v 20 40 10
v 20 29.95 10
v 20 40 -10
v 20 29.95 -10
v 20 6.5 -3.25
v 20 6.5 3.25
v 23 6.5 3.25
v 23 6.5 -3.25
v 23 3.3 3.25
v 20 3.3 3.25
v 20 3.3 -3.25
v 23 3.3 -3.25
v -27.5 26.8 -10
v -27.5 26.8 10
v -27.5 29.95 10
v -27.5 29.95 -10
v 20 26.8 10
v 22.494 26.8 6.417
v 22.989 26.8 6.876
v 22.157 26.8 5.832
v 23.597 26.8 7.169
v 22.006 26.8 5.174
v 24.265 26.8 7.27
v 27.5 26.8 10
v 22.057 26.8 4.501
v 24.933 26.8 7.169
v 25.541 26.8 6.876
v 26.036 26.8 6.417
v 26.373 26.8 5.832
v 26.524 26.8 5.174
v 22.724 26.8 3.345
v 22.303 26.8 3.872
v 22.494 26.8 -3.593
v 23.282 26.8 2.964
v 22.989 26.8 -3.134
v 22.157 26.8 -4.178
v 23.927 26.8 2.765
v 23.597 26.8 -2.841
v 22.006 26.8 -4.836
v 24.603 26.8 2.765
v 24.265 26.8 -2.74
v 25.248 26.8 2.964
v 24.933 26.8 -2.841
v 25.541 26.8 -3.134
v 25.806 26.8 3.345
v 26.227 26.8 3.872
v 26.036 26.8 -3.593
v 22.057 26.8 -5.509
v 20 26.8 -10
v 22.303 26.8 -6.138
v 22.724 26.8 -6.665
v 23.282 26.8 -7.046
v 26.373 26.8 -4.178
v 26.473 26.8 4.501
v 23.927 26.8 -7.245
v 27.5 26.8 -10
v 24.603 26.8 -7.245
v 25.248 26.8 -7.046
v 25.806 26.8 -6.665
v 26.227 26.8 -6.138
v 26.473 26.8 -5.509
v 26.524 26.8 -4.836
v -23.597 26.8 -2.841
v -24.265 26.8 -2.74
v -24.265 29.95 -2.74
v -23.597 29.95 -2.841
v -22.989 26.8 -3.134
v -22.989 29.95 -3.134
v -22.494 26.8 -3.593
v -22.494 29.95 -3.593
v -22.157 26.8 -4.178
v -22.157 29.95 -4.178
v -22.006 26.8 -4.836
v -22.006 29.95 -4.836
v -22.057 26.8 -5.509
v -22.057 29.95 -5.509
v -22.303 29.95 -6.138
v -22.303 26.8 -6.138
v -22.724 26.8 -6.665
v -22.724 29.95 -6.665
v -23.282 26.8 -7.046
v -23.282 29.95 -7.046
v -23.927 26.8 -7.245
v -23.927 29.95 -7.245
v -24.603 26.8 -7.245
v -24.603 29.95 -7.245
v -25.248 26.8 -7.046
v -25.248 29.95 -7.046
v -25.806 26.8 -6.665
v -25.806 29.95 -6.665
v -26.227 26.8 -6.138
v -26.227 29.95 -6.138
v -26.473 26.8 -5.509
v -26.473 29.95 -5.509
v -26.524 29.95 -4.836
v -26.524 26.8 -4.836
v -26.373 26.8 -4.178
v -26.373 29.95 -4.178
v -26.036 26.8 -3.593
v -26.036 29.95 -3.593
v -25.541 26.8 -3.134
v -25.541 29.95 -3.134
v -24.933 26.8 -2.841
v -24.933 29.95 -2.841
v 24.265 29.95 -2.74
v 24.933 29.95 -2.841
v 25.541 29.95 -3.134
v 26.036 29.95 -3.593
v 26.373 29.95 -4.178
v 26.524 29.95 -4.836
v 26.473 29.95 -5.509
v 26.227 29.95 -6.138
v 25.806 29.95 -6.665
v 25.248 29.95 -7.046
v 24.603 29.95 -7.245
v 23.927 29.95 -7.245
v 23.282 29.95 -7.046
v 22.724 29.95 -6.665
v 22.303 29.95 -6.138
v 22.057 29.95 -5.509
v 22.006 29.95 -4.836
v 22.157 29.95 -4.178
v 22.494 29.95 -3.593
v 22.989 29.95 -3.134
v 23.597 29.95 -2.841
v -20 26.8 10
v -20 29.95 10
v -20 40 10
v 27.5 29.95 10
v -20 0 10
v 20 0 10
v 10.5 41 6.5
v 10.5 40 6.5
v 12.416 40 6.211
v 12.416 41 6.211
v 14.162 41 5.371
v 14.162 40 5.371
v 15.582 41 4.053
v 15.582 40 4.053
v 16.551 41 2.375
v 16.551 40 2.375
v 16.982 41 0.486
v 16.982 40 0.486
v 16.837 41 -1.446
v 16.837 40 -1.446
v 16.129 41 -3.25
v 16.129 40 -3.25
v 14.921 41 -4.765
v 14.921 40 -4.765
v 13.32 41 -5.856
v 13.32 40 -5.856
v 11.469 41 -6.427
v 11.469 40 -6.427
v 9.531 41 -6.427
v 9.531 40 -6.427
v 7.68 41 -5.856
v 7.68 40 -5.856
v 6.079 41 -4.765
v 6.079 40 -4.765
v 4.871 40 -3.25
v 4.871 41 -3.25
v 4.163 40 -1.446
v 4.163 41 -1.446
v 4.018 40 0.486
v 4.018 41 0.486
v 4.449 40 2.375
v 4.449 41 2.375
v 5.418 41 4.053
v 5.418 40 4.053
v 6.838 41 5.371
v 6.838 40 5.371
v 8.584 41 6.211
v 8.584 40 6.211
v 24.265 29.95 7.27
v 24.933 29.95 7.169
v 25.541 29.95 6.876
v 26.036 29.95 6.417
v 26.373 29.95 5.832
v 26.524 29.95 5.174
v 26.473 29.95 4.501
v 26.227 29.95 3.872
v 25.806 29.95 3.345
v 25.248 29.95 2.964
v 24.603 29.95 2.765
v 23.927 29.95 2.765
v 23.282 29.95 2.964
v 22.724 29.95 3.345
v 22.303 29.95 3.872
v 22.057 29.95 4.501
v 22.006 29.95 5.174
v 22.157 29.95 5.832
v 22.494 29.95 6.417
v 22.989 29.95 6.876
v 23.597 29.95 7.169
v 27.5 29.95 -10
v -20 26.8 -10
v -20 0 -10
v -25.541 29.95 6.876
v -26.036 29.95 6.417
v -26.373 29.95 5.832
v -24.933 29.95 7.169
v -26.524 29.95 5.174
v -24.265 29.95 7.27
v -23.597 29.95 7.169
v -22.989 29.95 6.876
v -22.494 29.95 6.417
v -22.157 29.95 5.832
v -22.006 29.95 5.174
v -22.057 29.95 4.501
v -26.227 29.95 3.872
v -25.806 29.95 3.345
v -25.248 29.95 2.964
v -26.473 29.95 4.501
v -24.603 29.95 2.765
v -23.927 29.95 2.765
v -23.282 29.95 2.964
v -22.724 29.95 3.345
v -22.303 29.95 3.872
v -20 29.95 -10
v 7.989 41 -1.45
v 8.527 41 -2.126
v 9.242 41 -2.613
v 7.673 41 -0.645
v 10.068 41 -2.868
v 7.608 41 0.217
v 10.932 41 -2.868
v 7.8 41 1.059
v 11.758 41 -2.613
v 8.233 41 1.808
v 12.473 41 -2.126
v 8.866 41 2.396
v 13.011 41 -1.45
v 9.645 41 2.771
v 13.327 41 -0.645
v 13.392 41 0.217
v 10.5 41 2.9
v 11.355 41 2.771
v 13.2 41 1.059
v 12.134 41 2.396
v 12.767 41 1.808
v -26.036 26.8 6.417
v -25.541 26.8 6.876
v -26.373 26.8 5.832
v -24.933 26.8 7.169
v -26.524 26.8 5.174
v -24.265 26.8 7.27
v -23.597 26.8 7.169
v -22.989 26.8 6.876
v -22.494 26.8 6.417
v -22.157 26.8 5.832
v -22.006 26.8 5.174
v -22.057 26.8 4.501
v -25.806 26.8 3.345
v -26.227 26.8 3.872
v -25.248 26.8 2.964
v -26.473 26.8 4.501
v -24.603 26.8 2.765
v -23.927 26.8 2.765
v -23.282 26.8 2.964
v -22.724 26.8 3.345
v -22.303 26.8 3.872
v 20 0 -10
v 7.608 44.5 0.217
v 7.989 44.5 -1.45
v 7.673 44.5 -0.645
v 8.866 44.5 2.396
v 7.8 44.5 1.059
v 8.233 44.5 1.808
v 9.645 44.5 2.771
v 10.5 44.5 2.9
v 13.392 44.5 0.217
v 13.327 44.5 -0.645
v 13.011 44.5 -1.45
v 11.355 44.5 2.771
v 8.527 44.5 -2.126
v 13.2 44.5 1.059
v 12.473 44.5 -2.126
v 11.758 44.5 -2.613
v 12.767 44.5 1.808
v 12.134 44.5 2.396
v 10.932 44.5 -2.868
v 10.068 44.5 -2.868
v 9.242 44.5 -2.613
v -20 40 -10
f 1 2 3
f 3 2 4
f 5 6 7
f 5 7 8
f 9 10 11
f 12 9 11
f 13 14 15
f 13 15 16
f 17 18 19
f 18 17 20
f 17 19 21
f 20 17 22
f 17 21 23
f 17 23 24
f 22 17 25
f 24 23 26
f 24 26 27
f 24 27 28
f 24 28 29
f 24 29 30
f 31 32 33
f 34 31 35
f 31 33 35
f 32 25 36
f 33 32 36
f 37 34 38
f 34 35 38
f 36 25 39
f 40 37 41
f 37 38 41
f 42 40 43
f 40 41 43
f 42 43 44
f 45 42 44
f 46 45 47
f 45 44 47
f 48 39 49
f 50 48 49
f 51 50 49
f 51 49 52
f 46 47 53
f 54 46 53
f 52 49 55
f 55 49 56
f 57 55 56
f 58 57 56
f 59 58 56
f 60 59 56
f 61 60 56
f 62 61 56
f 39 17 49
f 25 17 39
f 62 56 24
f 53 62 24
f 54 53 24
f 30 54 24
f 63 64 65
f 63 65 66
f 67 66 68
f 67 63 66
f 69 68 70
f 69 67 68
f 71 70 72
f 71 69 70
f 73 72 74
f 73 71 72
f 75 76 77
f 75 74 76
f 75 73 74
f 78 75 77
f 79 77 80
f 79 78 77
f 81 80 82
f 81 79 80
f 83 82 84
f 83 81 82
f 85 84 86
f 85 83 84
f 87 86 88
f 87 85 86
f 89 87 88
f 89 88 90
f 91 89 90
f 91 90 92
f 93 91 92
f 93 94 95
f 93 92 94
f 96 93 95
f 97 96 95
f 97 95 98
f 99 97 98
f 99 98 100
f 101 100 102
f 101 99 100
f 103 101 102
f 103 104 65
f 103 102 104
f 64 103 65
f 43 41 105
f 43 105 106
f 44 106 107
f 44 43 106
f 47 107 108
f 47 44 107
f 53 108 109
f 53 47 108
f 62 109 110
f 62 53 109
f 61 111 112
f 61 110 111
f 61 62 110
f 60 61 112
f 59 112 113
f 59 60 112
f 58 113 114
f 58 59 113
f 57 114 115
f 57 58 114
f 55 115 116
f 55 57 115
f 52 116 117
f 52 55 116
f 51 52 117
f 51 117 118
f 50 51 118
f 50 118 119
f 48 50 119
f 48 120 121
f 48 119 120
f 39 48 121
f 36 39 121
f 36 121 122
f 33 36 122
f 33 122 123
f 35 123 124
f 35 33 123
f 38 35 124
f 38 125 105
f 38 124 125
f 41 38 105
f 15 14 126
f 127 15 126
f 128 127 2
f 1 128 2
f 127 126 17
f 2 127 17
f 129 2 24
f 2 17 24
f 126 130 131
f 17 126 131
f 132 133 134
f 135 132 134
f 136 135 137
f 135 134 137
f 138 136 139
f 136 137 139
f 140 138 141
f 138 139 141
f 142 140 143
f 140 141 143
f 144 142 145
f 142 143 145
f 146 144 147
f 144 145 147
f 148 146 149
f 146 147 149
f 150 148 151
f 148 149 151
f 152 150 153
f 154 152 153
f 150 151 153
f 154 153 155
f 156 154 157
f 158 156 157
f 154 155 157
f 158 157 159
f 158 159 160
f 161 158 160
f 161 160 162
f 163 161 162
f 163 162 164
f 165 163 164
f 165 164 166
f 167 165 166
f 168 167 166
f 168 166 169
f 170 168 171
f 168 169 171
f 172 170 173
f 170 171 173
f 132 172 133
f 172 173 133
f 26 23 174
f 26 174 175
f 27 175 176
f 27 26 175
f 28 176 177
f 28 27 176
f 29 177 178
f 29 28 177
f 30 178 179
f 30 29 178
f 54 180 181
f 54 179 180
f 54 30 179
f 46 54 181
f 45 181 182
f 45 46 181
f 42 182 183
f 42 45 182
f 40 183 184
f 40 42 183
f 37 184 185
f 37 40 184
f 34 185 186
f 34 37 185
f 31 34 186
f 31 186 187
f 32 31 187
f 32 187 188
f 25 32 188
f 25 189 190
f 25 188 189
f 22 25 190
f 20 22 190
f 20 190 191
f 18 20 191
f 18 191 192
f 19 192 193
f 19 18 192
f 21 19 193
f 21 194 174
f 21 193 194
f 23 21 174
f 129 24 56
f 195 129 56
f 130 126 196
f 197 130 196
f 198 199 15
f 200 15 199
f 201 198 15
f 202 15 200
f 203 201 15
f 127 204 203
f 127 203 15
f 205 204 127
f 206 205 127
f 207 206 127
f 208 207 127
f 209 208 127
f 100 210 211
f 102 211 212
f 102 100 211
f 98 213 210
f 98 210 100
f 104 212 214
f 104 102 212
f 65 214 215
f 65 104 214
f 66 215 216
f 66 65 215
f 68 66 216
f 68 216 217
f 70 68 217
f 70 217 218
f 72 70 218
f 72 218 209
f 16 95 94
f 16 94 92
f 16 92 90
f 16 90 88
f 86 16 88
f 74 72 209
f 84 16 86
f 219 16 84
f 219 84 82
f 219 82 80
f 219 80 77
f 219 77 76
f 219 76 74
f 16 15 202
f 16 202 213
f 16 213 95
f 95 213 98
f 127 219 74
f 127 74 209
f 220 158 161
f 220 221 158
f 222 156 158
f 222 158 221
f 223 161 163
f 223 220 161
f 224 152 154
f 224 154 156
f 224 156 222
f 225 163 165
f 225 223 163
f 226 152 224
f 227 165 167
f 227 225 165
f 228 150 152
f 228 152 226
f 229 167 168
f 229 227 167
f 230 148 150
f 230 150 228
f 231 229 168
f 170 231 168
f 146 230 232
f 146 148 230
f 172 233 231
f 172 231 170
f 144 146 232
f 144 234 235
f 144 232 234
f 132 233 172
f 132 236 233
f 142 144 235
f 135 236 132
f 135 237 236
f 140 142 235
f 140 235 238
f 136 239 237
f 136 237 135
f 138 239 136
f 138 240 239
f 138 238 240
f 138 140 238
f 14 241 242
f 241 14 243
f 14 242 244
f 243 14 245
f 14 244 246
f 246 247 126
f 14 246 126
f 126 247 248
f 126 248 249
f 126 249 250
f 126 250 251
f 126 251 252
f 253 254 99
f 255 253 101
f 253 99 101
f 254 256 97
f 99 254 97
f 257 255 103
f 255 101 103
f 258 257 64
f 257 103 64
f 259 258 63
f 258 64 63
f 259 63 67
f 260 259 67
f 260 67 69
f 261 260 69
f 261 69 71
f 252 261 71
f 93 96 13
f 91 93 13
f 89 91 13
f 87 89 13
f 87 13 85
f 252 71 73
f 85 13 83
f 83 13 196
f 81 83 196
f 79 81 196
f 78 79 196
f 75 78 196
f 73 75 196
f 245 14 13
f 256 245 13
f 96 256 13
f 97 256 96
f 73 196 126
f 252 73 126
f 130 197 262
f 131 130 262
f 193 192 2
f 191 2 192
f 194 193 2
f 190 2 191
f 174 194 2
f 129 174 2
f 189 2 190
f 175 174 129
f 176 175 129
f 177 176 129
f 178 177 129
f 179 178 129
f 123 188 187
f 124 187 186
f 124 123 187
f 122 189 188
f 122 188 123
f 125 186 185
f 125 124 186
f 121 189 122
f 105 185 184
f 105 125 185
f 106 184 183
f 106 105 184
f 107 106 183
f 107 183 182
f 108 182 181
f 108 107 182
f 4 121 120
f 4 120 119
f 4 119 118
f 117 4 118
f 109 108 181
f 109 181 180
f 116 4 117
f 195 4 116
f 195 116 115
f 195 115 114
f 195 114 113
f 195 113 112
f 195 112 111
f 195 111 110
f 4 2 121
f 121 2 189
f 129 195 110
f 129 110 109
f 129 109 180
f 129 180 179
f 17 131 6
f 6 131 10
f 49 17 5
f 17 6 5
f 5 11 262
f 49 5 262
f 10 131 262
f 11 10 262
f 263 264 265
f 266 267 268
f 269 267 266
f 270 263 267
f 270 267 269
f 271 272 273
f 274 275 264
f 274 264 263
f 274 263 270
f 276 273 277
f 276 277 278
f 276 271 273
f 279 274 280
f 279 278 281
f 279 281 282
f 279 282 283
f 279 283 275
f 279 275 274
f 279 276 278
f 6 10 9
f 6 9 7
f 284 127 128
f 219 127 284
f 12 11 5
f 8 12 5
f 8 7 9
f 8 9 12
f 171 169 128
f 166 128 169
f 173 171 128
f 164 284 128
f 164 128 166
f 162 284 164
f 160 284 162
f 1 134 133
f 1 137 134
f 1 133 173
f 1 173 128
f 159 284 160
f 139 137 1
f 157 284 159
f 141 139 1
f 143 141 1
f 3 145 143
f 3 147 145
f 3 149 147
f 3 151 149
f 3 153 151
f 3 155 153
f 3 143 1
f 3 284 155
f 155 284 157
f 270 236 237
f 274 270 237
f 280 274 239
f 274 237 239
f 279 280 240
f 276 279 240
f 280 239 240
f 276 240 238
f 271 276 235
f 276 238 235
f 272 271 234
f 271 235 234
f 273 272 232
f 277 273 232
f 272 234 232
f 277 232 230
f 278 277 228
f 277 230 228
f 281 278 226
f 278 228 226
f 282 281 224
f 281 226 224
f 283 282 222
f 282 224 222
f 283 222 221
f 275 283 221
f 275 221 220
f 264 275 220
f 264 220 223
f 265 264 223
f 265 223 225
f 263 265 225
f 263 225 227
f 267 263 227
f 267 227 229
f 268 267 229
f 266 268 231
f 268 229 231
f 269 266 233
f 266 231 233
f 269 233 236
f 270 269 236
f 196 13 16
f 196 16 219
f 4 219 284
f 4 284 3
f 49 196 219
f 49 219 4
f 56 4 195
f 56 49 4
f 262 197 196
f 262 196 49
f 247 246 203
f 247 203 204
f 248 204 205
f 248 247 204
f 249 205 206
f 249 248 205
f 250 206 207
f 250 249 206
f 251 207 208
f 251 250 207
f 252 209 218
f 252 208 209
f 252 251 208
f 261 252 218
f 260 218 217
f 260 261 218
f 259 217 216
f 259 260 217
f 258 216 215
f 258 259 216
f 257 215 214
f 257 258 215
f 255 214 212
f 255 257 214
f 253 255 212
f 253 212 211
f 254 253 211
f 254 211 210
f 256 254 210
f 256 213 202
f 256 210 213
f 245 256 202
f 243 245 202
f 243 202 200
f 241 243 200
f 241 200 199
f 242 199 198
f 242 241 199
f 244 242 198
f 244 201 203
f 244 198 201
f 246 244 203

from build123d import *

# Parameters (mm, degrees)
SKETCH1_W               = 40
SKETCH1_H               = 20
BOSS_EXTRUDE1_DEPTH     = 40
BOSS_EXTRUDE2_START     = -13.2
SKETCH2_W               = 55
SKETCH2_H               = 20
BOSS_EXTRUDE2_DEPTH     = 3.15
CUT_EXTRUDE1_DEPTH      = 42.871858091
CUT_EXTRUDE1_DEPTH_BACK = 42.871858091
SKETCH4_R               = 2.265
SKETCH5_R               = 6.5
BOSS_EXTRUDE3_DEPTH     = 1
SKETCH7_R               = 2.9
BOSS_EXTRUDE4_DEPTH     = 3.5
SKETCH8_W               = 6.5
SKETCH8_H               = 3.2
BOSS_EXTRUDE5_DEPTH     = 3


with BuildPart() as part:
    # Sketch1 → Boss-Extrude1 (new body)
    with BuildSketch(Plane(origin=(0, 0, 0), x_dir=(1, 0, 0), z_dir=(0, 1, 0))):
        Rectangle(SKETCH1_W, SKETCH1_H)
    extrude(amount=BOSS_EXTRUDE1_DEPTH)

    # Sketch2 → Boss-Extrude2 (add)
    with BuildSketch(Plane(origin=(0, 40, 0), x_dir=(1, 0, 0), z_dir=(0, 1, 0)).offset(BOSS_EXTRUDE2_START)):
        Rectangle(SKETCH2_W, SKETCH2_H)
    extrude(amount=BOSS_EXTRUDE2_DEPTH)

    # Sketch4 → Cut-Extrude1 (cut, two sides: drawn at the far end of the back side and taken through both)
    with BuildSketch(Plane(origin=(0, 29.95, 0), x_dir=(1, 0, 0), z_dir=(0, 1, 0)).offset(-CUT_EXTRUDE1_DEPTH_BACK)):
        with Locations(Location((-24.265, 5.005, 0), (0, 0, 270))):
            Circle(SKETCH4_R)
        with Locations(Location((-24.265, -5.005, 0), (0, 0, 270))):
            Circle(SKETCH4_R)
        with Locations(Location((24.265, -5.005, 0), (0, 0, 270))):
            Circle(SKETCH4_R)
        with Locations(Location((24.265, 5.005, 0), (0, 0, 270))):
            Circle(SKETCH4_R)
    extrude(amount=CUT_EXTRUDE1_DEPTH + CUT_EXTRUDE1_DEPTH_BACK, mode=Mode.SUBTRACT)

    # Sketch5 → Boss-Extrude3 (add)
    with BuildSketch(Plane(origin=(0, 40, 0), x_dir=(1, 0, 0), z_dir=(0, 1, 0))):
        with Locations(Location((10.5, 0, 0), (0, 0, 270))):
            Circle(SKETCH5_R)
    extrude(amount=BOSS_EXTRUDE3_DEPTH)

    # Sketch7 → Boss-Extrude4 (add)
    with BuildSketch(Plane(origin=(0, 41, 0), x_dir=(1, 0, 0), z_dir=(0, 1, 0))):
        with Locations(Location((10.5, 0, 0), (0, 0, 270))):
            Circle(SKETCH7_R)
    extrude(amount=BOSS_EXTRUDE4_DEPTH)

    # Sketch8 → Boss-Extrude5 (add)
    with BuildSketch(Plane(origin=(20, 0, 0), x_dir=(0, 0, -1), z_dir=(1, 0, 0))):
        with Locations((0, 4.9)):
            Rectangle(SKETCH8_W, SKETCH8_H)
    extrude(amount=BOSS_EXTRUDE5_DEPTH)


solid = part.part
